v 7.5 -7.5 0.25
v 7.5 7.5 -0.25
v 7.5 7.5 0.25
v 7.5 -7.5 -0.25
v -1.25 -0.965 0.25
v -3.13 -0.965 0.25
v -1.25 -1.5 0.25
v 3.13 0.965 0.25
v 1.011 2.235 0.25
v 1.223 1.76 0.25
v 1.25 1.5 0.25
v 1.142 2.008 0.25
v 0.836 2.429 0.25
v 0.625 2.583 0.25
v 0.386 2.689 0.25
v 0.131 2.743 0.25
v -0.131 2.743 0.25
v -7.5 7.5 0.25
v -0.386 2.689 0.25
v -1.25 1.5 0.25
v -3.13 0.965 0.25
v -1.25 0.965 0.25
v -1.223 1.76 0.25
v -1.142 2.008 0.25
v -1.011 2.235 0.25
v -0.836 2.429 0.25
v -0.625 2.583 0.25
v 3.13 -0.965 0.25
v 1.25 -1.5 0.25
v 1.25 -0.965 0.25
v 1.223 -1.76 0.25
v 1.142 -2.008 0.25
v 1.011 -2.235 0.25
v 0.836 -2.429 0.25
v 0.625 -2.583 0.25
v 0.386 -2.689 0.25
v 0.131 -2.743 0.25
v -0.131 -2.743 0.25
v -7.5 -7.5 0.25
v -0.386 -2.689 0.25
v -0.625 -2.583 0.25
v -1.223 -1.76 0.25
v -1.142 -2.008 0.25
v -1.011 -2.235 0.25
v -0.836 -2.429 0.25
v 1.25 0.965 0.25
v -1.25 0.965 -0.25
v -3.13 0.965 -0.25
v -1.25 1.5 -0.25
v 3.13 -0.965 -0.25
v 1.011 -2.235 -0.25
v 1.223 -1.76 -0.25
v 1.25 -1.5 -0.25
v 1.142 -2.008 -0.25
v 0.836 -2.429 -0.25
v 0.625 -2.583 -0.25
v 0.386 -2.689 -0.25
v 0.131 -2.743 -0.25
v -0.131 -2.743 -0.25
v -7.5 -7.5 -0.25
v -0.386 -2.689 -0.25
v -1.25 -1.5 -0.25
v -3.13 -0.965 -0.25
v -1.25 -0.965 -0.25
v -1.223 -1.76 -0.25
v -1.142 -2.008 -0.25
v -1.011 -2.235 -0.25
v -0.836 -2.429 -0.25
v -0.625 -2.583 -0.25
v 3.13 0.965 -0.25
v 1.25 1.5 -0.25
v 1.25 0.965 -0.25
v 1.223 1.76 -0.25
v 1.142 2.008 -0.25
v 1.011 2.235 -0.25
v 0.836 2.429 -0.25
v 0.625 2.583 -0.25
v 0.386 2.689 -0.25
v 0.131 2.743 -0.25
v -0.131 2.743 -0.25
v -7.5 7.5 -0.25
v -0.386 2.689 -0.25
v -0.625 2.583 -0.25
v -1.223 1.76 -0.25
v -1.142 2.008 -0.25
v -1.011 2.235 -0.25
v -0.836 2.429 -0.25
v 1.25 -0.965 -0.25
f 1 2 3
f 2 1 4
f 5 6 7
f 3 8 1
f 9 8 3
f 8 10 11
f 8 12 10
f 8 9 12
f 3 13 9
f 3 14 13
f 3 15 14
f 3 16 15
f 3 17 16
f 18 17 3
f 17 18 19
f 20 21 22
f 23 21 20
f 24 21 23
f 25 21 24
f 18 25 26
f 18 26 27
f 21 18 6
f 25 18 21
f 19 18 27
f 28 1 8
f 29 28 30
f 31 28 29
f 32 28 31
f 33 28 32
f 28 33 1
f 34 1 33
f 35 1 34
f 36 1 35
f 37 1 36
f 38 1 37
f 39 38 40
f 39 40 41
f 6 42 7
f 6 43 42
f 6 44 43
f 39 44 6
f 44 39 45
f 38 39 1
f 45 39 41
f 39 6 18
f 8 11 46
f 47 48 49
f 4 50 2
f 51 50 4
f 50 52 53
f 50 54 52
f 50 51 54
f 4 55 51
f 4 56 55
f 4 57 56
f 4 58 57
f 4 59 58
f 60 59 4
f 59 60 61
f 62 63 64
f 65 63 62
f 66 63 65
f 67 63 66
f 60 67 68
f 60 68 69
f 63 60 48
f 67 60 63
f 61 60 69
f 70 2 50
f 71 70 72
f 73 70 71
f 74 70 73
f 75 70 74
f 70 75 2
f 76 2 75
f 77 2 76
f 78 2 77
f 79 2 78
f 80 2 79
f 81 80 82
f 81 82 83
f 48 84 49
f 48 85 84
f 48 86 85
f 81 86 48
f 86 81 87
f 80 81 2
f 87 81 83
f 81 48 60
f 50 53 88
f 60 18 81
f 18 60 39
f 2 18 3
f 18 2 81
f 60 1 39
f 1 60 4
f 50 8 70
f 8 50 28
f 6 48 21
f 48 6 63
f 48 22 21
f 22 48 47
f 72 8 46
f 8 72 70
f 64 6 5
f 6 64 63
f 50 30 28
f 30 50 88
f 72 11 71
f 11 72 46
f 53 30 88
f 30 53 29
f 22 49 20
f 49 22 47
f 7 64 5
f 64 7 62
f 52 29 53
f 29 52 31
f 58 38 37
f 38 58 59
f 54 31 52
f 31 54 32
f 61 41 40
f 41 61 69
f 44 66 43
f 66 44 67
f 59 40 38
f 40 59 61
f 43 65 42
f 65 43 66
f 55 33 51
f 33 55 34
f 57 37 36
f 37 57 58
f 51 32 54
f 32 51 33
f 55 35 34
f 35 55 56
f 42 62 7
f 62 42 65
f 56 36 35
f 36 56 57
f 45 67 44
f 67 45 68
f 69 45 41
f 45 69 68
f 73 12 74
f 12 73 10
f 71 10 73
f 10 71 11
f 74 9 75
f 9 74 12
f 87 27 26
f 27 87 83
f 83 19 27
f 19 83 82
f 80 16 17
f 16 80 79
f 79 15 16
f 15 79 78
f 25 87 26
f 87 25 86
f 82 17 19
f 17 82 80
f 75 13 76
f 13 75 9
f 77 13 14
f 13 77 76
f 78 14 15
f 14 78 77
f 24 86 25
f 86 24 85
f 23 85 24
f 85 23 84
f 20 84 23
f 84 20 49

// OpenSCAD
$fs = 0.1;

difference() {
    cube([15, 15, 0.5], center=true);
    cube([6.26, 1.93,1], center=true);
    cube([2.5, 3,1], center=true);
    translate([0, -1.5, -2]){
        cylinder(5, 1.25, 1.25);
    }
    translate([0, 1.5, -2]){
        cylinder(5, 1.25, 1.25);
    }
}
